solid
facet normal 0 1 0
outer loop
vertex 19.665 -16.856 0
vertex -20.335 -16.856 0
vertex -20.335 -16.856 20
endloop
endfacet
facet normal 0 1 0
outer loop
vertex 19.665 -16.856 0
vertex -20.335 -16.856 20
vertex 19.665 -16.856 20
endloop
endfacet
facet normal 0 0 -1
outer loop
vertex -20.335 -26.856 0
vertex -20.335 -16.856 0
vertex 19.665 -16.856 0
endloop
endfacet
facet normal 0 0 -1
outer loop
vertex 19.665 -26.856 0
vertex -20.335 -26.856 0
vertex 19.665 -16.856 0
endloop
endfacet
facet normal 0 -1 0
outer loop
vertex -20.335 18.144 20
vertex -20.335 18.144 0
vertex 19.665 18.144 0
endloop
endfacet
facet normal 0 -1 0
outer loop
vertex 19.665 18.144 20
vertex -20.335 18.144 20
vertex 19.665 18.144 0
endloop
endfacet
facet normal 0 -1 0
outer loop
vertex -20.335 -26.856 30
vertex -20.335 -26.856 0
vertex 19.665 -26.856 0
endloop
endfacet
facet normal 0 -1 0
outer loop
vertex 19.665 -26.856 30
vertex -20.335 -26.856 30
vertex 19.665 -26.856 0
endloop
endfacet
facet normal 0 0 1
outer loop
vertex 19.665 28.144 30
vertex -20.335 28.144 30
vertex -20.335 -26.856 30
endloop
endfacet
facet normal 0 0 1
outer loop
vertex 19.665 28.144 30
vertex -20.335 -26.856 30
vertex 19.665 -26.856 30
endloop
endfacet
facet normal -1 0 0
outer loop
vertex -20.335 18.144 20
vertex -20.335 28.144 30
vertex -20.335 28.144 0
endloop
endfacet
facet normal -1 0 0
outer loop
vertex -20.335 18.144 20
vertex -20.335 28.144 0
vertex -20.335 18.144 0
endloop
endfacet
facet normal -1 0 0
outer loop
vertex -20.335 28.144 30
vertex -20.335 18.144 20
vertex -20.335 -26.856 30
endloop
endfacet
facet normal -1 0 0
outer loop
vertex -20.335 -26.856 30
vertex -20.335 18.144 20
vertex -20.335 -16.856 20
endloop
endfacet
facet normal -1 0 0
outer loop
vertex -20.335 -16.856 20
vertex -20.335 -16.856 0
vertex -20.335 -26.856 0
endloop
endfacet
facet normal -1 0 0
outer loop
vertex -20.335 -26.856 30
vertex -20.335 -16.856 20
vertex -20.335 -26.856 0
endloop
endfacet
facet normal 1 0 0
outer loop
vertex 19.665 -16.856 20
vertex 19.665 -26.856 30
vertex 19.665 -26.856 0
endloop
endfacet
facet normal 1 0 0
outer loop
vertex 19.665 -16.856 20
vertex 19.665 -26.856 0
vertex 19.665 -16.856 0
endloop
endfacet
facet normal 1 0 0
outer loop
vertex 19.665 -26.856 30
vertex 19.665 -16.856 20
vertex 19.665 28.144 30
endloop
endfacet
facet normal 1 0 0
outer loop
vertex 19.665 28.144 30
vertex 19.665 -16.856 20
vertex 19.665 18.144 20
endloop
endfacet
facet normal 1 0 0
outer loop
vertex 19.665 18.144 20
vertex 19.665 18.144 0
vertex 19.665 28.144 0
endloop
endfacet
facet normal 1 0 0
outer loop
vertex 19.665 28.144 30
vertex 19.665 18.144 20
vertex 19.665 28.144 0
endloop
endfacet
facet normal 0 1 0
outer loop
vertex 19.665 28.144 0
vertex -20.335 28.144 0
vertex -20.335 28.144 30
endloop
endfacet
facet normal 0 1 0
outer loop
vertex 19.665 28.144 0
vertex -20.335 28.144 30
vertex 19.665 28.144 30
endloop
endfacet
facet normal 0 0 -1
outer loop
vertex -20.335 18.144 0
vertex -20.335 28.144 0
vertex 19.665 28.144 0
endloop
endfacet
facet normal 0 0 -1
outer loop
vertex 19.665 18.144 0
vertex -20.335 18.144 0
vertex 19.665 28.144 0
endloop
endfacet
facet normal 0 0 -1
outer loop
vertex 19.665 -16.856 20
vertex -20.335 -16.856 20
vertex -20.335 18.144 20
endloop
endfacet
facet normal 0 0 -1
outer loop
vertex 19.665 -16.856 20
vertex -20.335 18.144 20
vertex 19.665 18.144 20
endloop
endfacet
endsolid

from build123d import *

# Parameters (mm, degrees)
F0_W     = 40
F0_H     = 35
F1_DEPTH = 30
F0_H_2   = 10
F2_DEPTH = 30
F3_W     = 40
F3_H     = 35
F4_DEPTH = 20


with BuildPart() as f1:
    # F0 (on Top) → F1 (new body)
    with BuildSketch(Plane.XY):
        with Locations((-0.33484, 0.644105)):
            Rectangle(F0_W, F0_H)
    extrude(amount=F1_DEPTH)

    # F0 (on Top) → F2 (join)
    with BuildSketch(Plane.XY):
        with Locations((-0.33484, 23.144105)):
            Rectangle(F0_W, F0_H_2)
        with Locations((-0.33484, 0.644105)):
            Rectangle(F0_W, F0_H)
        with Locations((-0.33484, -21.855895)):
            Rectangle(F0_W, F0_H_2)
    extrude(amount=F2_DEPTH)

    # F3 (on face) → F4 (cut)
    with BuildSketch(Plane(origin=(0, 0, 0), x_dir=(1, 0, 0), z_dir=(0, 0, -1))):
        with Locations((-0.33484, -0.644105)):
            Rectangle(F3_W, F3_H)
    extrude(amount=-F4_DEPTH, mode=Mode.SUBTRACT)


solid = f1.part
